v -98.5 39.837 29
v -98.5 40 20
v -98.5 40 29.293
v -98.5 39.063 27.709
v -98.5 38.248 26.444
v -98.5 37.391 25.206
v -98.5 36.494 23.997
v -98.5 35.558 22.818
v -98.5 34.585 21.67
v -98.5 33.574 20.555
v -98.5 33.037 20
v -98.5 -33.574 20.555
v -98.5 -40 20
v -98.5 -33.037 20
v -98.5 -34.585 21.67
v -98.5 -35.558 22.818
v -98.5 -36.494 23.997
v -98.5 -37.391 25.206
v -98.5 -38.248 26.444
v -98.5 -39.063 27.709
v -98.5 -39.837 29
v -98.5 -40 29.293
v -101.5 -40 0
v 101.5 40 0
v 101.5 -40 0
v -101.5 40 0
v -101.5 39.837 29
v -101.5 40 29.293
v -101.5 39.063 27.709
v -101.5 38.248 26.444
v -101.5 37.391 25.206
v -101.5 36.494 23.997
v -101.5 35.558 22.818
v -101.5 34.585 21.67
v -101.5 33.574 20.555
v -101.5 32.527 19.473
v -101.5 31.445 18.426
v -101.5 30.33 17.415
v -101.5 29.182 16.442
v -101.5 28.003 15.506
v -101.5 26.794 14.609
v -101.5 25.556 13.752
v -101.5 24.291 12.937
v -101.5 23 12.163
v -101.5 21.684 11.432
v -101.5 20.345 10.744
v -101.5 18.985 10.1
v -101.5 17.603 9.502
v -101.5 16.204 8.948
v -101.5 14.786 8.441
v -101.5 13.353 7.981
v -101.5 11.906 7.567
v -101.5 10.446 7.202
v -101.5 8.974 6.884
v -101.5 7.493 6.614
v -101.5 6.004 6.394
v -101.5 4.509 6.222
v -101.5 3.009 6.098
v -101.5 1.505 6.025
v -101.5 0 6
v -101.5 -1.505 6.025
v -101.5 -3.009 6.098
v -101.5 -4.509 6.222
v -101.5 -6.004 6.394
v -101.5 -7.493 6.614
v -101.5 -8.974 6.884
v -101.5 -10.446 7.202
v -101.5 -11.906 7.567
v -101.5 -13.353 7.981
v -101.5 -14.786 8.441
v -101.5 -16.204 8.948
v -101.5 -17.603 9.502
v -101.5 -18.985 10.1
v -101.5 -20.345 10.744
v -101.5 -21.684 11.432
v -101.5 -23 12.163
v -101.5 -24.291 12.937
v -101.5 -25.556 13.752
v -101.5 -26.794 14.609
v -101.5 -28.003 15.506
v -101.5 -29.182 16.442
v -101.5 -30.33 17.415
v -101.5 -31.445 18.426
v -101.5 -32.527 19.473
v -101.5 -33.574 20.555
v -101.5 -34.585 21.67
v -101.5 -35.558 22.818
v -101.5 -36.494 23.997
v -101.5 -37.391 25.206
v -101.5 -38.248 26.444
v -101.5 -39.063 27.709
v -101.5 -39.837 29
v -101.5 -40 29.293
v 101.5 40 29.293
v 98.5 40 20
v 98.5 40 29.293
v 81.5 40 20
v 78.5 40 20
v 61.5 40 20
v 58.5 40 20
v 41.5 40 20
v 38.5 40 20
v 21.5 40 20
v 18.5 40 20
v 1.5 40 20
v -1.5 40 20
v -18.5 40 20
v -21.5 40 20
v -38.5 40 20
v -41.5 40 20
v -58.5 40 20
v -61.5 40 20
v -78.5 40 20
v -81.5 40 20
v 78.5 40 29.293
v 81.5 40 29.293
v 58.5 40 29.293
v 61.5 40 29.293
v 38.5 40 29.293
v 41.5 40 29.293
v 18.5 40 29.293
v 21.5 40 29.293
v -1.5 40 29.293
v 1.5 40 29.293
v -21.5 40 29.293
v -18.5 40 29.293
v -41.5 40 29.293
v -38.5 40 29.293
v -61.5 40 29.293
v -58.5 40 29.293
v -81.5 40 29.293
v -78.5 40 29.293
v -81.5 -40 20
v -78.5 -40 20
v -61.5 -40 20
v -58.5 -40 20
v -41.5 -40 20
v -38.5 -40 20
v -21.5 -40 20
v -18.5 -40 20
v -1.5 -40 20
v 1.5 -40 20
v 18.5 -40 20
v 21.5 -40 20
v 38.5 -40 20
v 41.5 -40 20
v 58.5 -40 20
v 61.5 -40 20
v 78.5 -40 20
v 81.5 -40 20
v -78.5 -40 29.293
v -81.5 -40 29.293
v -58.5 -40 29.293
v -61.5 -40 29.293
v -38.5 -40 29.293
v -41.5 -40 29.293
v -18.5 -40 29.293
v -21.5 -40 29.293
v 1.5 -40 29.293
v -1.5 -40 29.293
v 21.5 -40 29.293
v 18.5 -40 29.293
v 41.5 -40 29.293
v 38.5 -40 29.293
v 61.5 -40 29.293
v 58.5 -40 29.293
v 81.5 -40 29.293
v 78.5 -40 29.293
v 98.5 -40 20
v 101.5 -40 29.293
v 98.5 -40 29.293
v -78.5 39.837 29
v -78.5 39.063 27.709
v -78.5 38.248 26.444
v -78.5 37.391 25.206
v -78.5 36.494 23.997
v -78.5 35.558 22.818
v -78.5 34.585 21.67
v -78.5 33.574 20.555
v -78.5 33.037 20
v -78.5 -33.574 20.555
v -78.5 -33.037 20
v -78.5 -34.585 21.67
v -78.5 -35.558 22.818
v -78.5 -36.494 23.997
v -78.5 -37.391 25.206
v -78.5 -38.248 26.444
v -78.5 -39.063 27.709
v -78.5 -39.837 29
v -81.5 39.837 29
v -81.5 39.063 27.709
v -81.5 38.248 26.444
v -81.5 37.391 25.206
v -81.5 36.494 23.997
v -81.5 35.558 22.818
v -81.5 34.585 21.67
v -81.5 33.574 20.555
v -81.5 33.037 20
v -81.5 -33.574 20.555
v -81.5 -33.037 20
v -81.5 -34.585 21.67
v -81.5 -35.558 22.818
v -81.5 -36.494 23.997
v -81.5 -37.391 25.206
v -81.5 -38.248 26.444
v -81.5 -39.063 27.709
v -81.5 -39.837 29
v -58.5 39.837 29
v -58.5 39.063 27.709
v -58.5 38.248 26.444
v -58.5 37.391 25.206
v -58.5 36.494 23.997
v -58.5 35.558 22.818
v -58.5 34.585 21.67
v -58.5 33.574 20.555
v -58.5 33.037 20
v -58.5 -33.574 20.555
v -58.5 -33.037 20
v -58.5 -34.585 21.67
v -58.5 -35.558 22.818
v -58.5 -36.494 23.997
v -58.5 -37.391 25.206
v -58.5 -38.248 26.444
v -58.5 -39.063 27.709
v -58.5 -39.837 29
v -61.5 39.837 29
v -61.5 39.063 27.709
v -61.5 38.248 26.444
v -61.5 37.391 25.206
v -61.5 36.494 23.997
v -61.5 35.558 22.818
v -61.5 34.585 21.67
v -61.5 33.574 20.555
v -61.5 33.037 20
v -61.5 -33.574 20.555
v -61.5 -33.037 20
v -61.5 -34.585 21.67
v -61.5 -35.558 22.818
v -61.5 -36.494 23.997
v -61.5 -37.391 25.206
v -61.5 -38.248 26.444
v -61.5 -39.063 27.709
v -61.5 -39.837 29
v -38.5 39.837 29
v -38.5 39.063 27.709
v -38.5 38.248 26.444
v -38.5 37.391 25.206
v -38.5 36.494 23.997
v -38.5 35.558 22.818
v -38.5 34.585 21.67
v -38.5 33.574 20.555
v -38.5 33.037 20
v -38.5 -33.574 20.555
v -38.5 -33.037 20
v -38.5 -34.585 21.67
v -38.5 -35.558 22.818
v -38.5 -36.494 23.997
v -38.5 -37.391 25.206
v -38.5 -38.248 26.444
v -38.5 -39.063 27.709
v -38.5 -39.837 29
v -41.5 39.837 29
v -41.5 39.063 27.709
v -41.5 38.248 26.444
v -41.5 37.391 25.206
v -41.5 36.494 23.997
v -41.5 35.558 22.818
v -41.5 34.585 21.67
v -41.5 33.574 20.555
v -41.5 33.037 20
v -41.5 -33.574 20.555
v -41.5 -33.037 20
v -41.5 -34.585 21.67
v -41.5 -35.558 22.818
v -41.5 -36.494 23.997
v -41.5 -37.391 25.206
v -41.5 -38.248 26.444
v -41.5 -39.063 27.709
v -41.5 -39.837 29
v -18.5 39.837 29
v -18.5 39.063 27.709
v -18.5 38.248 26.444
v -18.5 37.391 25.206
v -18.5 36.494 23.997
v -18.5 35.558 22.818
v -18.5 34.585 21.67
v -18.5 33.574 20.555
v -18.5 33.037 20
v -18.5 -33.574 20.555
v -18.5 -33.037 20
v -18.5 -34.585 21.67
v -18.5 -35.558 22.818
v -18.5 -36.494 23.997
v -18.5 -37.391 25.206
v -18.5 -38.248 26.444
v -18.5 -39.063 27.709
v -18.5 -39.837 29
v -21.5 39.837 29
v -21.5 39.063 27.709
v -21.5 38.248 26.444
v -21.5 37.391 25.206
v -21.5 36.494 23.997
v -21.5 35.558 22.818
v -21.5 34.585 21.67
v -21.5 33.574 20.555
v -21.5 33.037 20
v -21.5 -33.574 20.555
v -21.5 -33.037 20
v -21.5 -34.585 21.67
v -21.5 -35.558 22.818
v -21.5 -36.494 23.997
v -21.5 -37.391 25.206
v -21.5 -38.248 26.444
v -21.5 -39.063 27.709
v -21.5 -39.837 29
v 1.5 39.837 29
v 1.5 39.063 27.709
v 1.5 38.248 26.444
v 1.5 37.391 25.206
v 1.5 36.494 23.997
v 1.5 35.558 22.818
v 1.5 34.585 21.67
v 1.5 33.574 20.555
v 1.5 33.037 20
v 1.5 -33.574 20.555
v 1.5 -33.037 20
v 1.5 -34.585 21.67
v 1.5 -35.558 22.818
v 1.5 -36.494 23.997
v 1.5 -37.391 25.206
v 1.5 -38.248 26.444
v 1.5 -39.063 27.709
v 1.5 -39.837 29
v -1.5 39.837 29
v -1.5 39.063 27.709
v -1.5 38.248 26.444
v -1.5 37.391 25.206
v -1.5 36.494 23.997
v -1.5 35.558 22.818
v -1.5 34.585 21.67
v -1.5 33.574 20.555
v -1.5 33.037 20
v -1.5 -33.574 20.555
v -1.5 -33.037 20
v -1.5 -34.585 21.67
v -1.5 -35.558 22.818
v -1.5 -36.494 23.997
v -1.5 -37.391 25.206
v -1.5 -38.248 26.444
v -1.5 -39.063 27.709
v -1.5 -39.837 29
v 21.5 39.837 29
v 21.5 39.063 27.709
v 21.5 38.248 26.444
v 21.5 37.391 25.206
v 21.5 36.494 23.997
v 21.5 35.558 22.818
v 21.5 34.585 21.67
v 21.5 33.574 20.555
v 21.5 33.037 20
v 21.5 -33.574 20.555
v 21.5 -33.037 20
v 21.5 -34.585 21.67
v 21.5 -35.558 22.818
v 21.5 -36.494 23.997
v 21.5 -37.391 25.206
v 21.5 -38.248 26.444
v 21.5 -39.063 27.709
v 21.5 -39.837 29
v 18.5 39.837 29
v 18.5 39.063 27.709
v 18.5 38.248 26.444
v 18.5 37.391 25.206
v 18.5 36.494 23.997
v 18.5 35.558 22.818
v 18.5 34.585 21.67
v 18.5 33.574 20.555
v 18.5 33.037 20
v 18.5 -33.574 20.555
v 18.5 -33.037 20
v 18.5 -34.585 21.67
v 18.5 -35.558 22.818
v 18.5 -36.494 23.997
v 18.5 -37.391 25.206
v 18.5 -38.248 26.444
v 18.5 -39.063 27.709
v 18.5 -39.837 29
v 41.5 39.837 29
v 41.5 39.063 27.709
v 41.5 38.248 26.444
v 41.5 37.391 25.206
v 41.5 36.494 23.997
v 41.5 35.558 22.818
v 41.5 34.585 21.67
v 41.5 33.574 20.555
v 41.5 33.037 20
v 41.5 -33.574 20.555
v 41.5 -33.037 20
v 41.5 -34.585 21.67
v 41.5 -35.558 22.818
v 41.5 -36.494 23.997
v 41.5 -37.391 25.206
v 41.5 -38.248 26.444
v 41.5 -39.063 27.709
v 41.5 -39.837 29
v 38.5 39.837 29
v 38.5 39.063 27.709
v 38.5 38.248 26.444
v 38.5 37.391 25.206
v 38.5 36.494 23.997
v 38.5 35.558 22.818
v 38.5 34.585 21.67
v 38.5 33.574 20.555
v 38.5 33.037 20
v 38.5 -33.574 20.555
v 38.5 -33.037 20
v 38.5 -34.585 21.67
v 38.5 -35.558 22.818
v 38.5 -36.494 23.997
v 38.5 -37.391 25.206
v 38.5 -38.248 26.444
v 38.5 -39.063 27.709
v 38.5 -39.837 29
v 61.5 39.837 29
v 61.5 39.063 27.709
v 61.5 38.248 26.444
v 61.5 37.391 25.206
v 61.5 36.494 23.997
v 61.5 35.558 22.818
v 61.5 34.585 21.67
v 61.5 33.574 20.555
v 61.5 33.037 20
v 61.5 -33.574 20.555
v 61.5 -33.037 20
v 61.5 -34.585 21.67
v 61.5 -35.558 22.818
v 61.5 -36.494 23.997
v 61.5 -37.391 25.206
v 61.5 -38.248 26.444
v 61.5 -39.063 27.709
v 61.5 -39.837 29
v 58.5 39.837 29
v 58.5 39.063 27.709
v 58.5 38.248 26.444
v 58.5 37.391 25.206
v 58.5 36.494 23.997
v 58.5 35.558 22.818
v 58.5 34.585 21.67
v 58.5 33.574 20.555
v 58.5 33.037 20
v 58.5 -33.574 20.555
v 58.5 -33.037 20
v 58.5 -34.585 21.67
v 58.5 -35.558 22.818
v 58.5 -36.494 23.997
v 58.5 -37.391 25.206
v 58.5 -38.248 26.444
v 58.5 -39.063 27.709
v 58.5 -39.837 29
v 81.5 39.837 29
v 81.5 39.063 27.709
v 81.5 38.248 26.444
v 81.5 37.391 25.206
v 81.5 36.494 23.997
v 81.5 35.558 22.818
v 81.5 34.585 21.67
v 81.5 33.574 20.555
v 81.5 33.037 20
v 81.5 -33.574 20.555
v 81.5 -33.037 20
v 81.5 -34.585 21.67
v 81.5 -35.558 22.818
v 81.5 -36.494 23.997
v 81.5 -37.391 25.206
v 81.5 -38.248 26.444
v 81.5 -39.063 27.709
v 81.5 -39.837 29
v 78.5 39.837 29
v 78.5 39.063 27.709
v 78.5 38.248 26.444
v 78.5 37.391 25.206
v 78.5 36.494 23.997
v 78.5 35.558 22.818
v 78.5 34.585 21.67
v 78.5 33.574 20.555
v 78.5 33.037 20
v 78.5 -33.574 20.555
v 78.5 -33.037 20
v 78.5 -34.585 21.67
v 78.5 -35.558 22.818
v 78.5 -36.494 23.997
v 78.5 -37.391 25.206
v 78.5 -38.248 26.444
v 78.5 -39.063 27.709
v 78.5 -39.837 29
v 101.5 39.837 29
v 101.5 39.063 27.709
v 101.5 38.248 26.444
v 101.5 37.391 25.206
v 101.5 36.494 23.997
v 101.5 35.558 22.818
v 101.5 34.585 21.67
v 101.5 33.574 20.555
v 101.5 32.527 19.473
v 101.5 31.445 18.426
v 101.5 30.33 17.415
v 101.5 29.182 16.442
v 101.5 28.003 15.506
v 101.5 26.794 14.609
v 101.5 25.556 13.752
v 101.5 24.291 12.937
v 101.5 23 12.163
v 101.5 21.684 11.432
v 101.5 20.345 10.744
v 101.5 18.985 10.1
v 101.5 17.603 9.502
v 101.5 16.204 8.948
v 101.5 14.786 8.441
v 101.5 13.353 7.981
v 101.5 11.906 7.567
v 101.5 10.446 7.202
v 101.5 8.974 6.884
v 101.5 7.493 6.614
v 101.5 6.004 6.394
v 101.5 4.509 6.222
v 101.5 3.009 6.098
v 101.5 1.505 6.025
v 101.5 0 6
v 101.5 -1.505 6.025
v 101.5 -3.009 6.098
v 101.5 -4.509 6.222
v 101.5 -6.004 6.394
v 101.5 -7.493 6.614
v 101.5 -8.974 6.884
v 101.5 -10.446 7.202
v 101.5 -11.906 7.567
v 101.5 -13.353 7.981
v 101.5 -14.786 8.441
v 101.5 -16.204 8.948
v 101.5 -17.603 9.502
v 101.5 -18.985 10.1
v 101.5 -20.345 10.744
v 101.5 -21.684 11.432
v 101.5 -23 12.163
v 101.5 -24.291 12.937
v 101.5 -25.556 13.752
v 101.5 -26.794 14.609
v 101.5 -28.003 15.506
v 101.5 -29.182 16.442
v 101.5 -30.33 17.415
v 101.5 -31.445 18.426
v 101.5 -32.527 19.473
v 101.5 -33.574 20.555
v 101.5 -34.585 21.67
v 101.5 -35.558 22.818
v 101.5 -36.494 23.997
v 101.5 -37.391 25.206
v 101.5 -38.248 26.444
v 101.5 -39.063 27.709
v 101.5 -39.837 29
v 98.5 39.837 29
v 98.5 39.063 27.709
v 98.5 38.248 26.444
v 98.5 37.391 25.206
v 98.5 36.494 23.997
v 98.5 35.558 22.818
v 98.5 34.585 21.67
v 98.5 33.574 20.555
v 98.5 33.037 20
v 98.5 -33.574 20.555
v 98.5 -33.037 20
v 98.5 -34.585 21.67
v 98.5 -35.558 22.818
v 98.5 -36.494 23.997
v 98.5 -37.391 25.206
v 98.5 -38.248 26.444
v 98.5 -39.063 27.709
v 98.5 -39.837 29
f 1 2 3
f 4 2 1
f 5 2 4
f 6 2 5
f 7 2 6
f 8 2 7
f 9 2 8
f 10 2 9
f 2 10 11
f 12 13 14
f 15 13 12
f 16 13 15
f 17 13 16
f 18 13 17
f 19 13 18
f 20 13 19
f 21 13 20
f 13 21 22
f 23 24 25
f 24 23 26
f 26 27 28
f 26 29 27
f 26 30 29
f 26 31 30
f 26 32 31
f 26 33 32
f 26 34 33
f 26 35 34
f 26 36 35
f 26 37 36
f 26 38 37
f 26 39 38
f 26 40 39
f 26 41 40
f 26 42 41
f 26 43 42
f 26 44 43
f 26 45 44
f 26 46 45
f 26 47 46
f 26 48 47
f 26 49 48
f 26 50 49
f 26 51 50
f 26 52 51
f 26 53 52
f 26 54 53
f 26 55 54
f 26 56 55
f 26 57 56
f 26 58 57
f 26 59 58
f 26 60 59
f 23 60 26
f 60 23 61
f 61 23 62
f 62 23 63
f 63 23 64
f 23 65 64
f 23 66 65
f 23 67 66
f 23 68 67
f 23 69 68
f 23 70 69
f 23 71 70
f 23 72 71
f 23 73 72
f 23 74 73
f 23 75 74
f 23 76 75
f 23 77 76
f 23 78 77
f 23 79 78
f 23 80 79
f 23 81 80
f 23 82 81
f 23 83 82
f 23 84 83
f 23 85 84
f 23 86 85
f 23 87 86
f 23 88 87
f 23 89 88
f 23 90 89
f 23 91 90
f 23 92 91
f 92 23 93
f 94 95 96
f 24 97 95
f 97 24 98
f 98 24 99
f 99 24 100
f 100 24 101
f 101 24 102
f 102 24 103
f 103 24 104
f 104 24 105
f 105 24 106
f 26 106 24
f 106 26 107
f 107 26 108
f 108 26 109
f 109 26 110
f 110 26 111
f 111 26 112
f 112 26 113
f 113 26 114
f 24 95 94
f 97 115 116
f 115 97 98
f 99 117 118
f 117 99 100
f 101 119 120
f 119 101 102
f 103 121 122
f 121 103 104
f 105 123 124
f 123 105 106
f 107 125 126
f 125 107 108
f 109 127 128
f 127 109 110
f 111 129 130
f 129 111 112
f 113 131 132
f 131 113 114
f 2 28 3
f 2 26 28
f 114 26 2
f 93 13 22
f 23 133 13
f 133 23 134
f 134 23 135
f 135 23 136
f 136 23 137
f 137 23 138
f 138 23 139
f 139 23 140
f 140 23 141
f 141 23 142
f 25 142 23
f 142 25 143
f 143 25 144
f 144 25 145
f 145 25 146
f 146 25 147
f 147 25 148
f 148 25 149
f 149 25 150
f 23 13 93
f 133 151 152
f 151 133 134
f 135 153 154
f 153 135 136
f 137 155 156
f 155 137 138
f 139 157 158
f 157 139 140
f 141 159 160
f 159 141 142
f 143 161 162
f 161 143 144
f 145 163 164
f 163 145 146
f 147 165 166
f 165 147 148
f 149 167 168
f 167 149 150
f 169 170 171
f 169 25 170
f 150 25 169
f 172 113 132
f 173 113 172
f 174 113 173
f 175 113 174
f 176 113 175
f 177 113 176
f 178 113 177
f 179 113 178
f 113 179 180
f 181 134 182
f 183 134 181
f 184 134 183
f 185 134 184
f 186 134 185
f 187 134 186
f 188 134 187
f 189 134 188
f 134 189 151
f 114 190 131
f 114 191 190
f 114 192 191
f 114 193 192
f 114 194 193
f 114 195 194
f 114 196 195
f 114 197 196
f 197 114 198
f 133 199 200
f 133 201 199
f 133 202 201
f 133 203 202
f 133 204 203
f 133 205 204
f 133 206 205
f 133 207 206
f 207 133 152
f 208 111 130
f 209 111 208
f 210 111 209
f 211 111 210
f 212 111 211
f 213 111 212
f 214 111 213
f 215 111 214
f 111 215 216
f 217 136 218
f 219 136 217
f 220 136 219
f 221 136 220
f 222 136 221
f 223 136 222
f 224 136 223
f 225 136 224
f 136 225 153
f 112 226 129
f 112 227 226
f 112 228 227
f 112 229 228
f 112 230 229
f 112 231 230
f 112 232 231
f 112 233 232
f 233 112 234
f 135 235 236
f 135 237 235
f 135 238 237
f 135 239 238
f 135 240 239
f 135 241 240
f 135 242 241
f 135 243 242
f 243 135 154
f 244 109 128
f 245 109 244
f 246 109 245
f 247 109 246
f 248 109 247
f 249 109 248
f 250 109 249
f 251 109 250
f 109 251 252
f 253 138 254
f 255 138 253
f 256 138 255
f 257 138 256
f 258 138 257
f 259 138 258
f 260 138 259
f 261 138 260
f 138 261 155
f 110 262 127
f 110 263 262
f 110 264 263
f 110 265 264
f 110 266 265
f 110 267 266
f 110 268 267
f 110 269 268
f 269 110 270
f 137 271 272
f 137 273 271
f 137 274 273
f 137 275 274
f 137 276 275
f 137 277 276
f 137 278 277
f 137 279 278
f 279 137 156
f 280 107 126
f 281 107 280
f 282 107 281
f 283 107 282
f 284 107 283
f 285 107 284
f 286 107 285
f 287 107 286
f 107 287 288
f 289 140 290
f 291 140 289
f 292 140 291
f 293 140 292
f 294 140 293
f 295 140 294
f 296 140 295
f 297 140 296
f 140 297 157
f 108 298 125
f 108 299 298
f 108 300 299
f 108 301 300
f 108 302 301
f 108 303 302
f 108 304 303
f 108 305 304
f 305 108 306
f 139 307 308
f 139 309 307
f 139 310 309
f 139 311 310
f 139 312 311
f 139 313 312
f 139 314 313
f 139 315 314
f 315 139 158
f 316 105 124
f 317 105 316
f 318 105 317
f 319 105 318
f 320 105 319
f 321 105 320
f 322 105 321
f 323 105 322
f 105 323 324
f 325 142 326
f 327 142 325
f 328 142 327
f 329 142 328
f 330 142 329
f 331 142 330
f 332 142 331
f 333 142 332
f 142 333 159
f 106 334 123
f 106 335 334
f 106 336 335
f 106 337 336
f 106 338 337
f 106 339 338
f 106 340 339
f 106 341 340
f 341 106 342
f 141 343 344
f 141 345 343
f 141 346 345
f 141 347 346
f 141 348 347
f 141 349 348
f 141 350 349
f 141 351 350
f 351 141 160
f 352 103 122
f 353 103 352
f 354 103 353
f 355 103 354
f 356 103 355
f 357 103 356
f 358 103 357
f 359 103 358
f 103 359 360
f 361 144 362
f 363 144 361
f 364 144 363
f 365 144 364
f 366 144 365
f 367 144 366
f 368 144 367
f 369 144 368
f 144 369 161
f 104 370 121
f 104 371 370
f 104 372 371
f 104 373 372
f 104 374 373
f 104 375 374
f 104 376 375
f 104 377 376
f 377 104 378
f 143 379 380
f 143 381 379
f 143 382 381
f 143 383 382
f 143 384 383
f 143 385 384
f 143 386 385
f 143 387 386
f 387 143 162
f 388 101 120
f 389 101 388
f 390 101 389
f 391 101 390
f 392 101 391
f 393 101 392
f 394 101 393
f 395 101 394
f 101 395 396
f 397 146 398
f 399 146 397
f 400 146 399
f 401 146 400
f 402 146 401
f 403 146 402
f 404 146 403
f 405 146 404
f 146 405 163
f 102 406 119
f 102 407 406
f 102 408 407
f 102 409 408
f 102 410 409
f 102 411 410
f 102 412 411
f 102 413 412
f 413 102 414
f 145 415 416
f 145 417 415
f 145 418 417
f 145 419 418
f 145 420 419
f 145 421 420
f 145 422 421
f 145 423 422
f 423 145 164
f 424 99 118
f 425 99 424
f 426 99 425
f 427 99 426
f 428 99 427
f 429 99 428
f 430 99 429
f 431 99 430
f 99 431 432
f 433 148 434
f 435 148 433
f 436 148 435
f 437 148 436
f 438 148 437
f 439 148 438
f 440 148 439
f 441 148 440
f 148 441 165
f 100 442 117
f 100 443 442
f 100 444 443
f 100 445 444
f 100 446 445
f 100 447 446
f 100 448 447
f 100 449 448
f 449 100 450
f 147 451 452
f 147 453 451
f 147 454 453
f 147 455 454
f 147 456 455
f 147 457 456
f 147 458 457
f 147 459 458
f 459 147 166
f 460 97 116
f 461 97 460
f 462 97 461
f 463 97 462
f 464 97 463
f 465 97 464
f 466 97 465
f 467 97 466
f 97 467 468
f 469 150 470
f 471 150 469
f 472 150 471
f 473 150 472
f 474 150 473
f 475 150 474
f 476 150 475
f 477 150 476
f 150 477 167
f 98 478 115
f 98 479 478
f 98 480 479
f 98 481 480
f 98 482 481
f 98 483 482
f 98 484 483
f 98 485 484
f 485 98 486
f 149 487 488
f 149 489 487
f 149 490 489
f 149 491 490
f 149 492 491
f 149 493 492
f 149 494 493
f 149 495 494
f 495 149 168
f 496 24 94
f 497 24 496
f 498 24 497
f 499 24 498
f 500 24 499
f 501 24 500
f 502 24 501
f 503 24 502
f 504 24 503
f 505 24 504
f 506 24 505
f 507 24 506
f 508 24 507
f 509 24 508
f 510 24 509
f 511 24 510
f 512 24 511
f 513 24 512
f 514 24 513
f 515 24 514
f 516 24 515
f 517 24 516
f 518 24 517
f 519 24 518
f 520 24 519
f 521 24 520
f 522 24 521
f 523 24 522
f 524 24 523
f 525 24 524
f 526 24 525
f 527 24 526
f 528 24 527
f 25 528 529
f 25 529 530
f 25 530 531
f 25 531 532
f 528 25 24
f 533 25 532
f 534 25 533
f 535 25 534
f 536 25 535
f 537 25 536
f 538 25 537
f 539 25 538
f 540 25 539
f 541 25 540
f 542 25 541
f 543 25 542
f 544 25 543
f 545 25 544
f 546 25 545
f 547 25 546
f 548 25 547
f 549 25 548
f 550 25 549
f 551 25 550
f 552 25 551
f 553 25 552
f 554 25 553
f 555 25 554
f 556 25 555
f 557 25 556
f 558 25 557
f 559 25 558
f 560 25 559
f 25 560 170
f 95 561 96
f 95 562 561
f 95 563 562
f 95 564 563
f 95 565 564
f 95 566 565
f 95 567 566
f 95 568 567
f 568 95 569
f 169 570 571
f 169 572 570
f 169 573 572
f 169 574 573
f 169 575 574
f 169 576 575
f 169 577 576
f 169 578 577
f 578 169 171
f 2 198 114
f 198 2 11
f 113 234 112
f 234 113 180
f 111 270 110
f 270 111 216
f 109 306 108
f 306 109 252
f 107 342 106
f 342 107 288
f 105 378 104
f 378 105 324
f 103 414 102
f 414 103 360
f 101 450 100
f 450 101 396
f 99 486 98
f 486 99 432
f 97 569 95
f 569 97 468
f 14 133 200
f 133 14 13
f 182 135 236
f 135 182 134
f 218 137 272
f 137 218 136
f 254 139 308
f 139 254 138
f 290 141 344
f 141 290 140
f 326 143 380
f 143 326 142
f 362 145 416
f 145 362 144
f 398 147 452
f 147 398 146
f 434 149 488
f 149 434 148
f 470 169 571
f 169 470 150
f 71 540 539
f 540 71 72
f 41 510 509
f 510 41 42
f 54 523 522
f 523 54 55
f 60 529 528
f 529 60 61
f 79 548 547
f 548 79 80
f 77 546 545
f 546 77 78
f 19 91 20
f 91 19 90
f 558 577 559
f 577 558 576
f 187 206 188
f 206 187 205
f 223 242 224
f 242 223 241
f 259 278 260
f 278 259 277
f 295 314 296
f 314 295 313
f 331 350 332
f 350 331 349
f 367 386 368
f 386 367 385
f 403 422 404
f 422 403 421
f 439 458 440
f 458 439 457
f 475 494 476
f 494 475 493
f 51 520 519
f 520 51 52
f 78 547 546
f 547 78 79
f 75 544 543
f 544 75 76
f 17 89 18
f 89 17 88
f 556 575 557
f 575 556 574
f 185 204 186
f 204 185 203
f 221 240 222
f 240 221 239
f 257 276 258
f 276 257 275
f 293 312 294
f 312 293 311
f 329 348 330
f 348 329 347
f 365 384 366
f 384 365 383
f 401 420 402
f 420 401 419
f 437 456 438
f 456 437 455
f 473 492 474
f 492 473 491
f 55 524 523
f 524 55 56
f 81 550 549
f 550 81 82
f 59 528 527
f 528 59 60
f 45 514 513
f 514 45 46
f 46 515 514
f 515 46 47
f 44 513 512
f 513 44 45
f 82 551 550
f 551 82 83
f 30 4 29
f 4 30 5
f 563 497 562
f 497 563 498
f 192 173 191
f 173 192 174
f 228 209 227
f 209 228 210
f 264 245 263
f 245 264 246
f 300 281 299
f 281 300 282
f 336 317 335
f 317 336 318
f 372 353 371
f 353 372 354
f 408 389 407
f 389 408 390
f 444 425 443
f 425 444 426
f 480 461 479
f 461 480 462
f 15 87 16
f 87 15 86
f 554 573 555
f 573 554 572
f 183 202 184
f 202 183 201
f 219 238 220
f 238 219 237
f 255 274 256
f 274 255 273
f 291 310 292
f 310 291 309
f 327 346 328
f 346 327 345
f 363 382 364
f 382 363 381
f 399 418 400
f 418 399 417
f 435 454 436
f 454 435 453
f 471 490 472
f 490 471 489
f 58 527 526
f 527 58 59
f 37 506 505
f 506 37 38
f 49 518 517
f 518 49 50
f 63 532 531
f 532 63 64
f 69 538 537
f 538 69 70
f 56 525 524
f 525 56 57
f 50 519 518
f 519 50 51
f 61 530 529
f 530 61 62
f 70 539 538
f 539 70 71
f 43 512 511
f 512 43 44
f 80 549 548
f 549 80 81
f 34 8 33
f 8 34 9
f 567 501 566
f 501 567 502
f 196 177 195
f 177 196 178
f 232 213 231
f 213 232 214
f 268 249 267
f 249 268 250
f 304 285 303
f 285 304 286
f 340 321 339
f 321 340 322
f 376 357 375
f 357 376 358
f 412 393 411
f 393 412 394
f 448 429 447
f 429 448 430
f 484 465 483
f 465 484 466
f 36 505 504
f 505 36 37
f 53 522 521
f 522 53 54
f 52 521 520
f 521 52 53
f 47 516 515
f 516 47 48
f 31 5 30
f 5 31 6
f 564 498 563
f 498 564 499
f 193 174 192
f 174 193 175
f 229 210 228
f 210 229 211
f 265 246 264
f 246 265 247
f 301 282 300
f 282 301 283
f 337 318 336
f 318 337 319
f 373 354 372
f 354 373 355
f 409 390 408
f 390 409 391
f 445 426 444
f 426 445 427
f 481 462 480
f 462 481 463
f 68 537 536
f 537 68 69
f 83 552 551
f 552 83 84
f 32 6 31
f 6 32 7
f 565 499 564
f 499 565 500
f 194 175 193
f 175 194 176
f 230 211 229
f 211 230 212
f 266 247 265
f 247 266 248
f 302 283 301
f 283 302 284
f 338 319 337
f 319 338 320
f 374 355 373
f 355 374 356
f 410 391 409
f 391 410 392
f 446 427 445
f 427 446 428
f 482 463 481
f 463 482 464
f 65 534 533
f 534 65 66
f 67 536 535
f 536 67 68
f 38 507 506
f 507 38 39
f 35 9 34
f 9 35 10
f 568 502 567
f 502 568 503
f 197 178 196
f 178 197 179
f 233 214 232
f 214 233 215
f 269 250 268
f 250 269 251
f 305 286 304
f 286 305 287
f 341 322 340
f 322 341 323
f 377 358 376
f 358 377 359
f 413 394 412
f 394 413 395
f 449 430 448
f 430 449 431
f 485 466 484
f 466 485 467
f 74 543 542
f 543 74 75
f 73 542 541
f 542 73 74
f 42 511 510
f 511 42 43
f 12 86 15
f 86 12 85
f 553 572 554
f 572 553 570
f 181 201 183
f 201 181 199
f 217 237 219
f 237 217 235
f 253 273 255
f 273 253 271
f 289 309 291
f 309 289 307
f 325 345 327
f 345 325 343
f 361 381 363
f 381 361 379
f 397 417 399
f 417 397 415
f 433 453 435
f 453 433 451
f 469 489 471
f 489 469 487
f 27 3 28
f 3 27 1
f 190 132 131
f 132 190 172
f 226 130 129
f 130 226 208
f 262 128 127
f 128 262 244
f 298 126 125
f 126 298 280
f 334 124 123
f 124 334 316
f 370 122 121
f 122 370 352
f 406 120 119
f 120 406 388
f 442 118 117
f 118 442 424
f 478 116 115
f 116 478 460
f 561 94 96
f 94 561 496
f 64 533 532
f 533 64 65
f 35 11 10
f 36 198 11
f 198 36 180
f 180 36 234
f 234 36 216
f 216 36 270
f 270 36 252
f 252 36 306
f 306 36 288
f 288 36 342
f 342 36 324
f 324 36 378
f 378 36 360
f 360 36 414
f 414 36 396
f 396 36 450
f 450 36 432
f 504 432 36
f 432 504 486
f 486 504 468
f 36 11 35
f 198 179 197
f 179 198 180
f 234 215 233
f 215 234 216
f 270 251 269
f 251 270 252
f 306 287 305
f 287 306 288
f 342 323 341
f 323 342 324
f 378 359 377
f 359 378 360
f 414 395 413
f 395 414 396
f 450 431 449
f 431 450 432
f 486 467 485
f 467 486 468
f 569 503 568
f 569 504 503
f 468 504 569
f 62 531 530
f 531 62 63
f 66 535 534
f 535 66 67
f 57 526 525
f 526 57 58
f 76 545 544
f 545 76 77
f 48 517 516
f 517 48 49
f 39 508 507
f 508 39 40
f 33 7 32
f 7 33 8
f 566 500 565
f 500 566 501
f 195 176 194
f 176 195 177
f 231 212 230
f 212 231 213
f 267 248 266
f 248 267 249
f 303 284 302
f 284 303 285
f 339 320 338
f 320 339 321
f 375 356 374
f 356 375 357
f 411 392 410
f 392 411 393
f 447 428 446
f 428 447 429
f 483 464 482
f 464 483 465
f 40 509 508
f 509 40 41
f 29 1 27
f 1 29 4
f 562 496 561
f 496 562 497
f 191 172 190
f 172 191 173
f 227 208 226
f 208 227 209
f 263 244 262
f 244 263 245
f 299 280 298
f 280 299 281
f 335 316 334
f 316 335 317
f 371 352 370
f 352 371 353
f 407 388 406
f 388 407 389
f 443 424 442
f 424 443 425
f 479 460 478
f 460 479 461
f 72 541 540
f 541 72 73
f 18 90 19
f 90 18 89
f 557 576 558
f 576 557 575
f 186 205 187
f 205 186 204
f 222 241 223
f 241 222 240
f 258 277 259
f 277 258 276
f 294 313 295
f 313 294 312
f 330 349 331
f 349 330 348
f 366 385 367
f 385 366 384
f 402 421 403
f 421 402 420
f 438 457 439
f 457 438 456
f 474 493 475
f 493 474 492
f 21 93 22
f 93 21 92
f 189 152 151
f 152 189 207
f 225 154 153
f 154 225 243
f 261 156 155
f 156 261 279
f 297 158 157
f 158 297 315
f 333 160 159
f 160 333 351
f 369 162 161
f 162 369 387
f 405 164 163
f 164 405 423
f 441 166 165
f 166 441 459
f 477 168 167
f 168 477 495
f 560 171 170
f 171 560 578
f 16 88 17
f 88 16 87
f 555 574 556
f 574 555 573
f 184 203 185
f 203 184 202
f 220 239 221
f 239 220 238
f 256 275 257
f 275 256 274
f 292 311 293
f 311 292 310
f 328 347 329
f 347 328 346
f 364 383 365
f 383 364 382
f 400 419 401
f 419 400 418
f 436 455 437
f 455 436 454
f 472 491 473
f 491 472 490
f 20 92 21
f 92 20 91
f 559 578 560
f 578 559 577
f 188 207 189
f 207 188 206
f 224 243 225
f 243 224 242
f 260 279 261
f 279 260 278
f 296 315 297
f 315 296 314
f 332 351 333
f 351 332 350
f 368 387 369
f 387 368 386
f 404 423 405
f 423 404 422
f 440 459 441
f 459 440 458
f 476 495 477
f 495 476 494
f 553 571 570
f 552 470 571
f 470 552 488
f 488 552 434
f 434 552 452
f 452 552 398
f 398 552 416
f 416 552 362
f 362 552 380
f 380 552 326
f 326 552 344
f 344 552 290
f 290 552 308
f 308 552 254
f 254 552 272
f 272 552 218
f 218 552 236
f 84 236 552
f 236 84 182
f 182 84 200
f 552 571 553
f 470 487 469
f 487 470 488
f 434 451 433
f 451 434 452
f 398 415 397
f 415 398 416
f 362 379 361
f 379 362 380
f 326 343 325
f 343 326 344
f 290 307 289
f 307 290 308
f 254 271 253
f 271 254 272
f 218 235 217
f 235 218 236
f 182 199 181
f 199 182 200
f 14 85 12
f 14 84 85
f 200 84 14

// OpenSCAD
// KNOWN-WRONG PART (must fail): the cradle is cut through the dividers as well
// Rack for ten 90 mm Petri dishes standing on edge
// Category: benchware. A base with a curved cradle (a 46 mm radius channel along the rack) in which
// the dish rims rest, and eleven solid divider plates that keep the dishes upright, 17 mm apart.
// Print: PLA or PETG, as used (base on the bed), 0.2 mm layers; the rack is 203 mm long, so check
// it fits your bed diagonally if needed.
// SPDX-License-Identifier: CERN-OHL-P-2.0

/* [Rack] */
base = [203, 80, 20];     // X, Y, Z [mm]
cradle_r = 46;            // 90 mm dish + 2 mm clearance
cradle_axis_z = 52;       // cradle bottom at z = 52 - 46 = 6
n_fins = 11;
fin_t = 3;                // divider thickness (X)
fin_pitch = 20;           // centre-to-centre; slots are 20 - 3 = 17 mm wide
fin_h = 60;               // dividers rise from z = 0 to 60

/* [Hidden] */
eps = 0.01;

difference() {
    union() {
        translate([-base.x / 2, -base.y / 2, 0]) cube(base);
        for (i = [0 : n_fins - 1])
            translate([(i - (n_fins - 1) / 2) * fin_pitch - fin_t / 2, -base.y / 2, 0]) cube([fin_t, base.y, fin_h]);
    }
    translate([-base.x / 2 - 1, 0, cradle_axis_z]) rotate([0, 90, 0])
        cylinder(r = cradle_r, h = base.x + 2, $fn = 192);
}
